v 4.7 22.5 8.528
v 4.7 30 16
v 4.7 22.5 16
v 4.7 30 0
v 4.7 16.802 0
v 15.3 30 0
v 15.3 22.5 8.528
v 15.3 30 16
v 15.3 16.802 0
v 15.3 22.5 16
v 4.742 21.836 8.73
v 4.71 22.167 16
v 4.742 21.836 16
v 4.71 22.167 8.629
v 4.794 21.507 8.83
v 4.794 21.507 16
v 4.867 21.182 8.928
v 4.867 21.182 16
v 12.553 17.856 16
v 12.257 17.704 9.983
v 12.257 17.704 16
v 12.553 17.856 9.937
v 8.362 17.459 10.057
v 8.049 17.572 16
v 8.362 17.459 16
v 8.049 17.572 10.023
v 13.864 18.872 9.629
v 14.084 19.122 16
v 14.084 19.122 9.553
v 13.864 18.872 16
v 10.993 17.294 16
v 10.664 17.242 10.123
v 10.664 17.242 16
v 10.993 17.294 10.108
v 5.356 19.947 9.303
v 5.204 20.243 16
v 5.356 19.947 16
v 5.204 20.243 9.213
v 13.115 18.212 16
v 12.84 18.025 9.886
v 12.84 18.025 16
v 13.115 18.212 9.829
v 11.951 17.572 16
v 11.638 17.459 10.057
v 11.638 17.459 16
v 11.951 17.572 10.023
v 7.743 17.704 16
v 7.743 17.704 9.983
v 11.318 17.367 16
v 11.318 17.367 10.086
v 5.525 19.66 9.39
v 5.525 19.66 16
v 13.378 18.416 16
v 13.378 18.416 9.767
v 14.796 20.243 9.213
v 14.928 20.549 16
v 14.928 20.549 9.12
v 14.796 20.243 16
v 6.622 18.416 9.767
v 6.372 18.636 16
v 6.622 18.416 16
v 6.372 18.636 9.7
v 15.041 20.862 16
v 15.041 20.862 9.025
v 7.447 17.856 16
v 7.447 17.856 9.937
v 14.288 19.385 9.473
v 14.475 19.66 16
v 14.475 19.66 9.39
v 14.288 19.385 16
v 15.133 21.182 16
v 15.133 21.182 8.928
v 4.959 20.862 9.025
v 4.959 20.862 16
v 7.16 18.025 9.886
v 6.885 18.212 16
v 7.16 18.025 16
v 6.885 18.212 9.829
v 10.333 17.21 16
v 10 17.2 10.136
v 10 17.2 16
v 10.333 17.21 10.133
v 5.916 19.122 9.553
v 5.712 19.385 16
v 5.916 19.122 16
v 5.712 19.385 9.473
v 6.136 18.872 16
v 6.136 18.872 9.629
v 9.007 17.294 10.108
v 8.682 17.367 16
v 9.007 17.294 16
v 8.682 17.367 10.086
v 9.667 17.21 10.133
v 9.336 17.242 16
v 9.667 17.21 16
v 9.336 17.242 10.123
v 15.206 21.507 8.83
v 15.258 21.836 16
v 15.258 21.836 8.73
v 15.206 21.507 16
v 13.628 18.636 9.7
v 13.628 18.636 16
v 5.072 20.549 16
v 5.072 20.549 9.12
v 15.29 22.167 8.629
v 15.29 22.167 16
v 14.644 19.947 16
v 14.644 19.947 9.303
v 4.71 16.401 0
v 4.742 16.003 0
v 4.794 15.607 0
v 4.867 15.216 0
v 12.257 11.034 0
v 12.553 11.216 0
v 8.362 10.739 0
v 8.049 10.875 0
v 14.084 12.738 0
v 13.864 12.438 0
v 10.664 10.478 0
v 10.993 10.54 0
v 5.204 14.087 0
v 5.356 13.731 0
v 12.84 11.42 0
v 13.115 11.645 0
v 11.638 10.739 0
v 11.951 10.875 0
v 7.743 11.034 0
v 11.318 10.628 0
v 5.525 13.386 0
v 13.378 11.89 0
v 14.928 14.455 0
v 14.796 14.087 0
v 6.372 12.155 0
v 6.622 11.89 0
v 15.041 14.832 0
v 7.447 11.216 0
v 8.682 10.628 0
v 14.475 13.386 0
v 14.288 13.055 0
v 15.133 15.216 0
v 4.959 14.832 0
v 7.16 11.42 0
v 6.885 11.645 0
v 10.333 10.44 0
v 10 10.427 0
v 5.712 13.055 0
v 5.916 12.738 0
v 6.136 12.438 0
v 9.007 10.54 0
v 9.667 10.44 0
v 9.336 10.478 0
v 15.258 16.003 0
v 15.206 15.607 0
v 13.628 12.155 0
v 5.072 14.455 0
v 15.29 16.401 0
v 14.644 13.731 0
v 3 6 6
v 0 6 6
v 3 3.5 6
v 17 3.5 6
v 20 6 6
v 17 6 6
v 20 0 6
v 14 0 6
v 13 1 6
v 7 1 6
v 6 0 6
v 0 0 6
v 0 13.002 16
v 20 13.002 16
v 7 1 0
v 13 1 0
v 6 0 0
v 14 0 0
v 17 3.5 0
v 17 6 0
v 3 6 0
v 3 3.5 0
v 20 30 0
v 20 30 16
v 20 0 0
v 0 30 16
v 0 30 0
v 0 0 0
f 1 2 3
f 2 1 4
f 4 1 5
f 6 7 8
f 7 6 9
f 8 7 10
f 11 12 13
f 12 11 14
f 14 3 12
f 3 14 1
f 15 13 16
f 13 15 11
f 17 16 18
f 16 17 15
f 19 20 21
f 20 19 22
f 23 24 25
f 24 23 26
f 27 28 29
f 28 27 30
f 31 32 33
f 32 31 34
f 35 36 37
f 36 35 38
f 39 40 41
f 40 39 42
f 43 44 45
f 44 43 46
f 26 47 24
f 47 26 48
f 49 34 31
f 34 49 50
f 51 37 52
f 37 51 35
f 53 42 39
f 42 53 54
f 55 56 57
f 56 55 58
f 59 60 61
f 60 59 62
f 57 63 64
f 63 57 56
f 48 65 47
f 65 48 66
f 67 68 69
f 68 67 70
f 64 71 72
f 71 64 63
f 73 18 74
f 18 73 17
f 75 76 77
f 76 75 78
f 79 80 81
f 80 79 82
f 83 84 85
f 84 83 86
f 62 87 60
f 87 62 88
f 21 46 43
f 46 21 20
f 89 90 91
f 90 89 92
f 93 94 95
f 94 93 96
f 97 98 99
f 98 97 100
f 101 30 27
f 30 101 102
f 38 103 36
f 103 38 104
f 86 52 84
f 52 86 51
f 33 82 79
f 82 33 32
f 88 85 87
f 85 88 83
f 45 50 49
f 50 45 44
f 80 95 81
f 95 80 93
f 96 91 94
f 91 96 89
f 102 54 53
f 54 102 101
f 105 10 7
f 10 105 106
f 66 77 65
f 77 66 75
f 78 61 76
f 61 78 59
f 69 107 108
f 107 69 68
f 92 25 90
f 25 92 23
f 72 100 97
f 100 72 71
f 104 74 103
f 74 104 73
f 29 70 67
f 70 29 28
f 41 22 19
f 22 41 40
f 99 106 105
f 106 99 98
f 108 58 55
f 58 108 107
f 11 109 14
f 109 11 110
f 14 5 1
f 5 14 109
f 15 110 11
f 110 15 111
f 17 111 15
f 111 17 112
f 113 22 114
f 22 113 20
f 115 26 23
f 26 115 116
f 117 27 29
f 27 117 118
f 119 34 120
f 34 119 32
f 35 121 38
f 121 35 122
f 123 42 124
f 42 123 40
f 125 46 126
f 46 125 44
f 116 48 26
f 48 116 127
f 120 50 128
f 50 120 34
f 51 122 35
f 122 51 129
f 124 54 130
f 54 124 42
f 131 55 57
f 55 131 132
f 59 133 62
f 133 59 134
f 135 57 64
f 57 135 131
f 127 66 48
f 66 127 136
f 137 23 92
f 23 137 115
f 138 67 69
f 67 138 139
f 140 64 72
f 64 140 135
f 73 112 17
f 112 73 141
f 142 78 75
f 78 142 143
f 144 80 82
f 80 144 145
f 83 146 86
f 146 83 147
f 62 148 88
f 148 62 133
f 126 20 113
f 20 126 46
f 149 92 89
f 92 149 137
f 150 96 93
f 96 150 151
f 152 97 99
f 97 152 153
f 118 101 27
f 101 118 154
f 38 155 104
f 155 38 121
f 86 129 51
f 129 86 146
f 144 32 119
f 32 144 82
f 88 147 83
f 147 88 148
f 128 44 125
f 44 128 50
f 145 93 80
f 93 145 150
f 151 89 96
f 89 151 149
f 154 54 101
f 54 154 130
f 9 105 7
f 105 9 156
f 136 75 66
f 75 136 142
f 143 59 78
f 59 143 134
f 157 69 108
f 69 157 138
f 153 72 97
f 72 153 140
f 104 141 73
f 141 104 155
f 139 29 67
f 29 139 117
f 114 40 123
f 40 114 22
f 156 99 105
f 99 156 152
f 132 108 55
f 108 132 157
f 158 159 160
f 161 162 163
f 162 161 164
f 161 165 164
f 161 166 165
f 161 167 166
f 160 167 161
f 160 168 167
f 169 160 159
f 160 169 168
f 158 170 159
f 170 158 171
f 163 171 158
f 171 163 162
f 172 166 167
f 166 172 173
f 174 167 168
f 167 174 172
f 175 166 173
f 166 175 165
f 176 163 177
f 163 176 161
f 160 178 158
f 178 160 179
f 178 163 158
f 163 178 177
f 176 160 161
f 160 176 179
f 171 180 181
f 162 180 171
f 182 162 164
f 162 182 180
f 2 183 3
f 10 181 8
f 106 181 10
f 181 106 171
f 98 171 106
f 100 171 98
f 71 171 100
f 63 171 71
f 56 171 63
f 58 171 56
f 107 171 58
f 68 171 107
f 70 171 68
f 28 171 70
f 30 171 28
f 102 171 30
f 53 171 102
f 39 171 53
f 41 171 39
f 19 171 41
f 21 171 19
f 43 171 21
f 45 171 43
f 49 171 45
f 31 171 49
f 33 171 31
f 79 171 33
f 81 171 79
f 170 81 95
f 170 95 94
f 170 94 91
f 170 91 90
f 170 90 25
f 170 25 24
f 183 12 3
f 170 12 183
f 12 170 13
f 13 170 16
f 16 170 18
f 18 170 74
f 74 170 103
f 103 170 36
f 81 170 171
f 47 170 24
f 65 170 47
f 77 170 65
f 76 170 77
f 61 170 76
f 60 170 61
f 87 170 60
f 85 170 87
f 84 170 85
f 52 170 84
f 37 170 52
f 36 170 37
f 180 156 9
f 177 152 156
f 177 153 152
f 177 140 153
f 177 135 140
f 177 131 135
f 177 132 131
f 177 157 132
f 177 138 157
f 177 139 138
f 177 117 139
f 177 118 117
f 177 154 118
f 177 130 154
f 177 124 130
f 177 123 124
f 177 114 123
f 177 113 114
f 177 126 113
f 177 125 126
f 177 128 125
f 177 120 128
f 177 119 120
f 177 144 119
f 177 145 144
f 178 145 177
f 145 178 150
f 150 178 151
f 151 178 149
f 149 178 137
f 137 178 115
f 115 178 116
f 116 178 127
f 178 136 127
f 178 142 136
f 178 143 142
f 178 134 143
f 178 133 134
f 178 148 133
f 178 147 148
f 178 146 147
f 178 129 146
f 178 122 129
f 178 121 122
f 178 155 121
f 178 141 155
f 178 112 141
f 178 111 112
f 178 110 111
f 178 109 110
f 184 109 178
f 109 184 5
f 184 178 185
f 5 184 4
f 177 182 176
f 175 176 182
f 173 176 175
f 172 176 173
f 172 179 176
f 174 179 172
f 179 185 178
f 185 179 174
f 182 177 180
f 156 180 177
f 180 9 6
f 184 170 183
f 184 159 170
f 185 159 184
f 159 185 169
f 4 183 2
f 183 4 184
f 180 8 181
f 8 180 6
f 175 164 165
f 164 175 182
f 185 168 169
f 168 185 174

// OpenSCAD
// Created from Code_Ycorner (x3).stl
// https://github.com/Mecan0/Code
// By J.Rodigo (www.jra.so)
// Licence Creative commons atribution & share alike.

/**************************/
// Parámetros de la pieza  /
/**************************/

// Diámetro del tornillo (10.6)
dPas = 10.6;	

// Pieza principal a trabajar
module bloque(){
	cube([20, 30, 16]);	
}

// Taladro y redondeo en forma de U (Centrado)
// (d,h,u) = (diámetro,altura,largo de vaciado)
module RedU(d,h,u){ 
		// Taladro vertical
		translate([(d/2)+(u-d)/2, 0, 0])
		cube([u, d, h],center=true);
		// Vaciado en forma de U
		translate([0, 0, -h/2])
		rotate( 90, [0, 0, 1])
		cylinder(h = h, r = d/2, $fn=100);
}

// Vaciado en forma de U para el tornillo
module taladro(){
	// Vaciado en forma de U (Vertical)
	translate([10, 22.5, 8])
	rotate( 90, [0, 0, 1])
	RedU(dPas,17,8);
	// Vaciado en forma de U (Inclinado)
	translate([10, 19.08, 3.41])
	rotate(-33.75, [1,0,0])
	rotate( 90, [0, 0, 1])
	RedU(dPas,25,8);
}

// Vaciado y chaflán
module vaciochaflan(){
	// Vaciado plano
	translate([-1, -1, 6])
	cube([22, 7, 11]);
	// Vaciado chaflán
	translate([-1, 6, 6])
	rotate(55, [1,0,0])
	cube([22, 15, 8]);
}

// Tope para la varilla lisa
module tope(){	
	// Tope de soporte de la varilla lisa
	translate([7, -1, -1])
	cube([6, 2, 8]);
	// Chaflán a 45º
	translate([7, 1, -1])
	rotate(225, [0,0,1])
	cube([2, 2, 8]);
	// Chaflán a 45º
	translate([13, 1, -1])
	rotate(225, [0,0,1])
	cube([2, 2, 8]);
	// Vaciado interior del tope
	translate([3, 3.5, -1])
	cube([14, 2.5, 8]);
}

// Creamos la pieza a partir del bloque y todas sus operaciones
module pieza(){
	// Bloque principal de la pieza
	difference() {
		bloque();
		union() {
			taladro();
			vaciochaflan();
			tope();
		}
	}
}

// Generamos la pieza!!

	pieza();
